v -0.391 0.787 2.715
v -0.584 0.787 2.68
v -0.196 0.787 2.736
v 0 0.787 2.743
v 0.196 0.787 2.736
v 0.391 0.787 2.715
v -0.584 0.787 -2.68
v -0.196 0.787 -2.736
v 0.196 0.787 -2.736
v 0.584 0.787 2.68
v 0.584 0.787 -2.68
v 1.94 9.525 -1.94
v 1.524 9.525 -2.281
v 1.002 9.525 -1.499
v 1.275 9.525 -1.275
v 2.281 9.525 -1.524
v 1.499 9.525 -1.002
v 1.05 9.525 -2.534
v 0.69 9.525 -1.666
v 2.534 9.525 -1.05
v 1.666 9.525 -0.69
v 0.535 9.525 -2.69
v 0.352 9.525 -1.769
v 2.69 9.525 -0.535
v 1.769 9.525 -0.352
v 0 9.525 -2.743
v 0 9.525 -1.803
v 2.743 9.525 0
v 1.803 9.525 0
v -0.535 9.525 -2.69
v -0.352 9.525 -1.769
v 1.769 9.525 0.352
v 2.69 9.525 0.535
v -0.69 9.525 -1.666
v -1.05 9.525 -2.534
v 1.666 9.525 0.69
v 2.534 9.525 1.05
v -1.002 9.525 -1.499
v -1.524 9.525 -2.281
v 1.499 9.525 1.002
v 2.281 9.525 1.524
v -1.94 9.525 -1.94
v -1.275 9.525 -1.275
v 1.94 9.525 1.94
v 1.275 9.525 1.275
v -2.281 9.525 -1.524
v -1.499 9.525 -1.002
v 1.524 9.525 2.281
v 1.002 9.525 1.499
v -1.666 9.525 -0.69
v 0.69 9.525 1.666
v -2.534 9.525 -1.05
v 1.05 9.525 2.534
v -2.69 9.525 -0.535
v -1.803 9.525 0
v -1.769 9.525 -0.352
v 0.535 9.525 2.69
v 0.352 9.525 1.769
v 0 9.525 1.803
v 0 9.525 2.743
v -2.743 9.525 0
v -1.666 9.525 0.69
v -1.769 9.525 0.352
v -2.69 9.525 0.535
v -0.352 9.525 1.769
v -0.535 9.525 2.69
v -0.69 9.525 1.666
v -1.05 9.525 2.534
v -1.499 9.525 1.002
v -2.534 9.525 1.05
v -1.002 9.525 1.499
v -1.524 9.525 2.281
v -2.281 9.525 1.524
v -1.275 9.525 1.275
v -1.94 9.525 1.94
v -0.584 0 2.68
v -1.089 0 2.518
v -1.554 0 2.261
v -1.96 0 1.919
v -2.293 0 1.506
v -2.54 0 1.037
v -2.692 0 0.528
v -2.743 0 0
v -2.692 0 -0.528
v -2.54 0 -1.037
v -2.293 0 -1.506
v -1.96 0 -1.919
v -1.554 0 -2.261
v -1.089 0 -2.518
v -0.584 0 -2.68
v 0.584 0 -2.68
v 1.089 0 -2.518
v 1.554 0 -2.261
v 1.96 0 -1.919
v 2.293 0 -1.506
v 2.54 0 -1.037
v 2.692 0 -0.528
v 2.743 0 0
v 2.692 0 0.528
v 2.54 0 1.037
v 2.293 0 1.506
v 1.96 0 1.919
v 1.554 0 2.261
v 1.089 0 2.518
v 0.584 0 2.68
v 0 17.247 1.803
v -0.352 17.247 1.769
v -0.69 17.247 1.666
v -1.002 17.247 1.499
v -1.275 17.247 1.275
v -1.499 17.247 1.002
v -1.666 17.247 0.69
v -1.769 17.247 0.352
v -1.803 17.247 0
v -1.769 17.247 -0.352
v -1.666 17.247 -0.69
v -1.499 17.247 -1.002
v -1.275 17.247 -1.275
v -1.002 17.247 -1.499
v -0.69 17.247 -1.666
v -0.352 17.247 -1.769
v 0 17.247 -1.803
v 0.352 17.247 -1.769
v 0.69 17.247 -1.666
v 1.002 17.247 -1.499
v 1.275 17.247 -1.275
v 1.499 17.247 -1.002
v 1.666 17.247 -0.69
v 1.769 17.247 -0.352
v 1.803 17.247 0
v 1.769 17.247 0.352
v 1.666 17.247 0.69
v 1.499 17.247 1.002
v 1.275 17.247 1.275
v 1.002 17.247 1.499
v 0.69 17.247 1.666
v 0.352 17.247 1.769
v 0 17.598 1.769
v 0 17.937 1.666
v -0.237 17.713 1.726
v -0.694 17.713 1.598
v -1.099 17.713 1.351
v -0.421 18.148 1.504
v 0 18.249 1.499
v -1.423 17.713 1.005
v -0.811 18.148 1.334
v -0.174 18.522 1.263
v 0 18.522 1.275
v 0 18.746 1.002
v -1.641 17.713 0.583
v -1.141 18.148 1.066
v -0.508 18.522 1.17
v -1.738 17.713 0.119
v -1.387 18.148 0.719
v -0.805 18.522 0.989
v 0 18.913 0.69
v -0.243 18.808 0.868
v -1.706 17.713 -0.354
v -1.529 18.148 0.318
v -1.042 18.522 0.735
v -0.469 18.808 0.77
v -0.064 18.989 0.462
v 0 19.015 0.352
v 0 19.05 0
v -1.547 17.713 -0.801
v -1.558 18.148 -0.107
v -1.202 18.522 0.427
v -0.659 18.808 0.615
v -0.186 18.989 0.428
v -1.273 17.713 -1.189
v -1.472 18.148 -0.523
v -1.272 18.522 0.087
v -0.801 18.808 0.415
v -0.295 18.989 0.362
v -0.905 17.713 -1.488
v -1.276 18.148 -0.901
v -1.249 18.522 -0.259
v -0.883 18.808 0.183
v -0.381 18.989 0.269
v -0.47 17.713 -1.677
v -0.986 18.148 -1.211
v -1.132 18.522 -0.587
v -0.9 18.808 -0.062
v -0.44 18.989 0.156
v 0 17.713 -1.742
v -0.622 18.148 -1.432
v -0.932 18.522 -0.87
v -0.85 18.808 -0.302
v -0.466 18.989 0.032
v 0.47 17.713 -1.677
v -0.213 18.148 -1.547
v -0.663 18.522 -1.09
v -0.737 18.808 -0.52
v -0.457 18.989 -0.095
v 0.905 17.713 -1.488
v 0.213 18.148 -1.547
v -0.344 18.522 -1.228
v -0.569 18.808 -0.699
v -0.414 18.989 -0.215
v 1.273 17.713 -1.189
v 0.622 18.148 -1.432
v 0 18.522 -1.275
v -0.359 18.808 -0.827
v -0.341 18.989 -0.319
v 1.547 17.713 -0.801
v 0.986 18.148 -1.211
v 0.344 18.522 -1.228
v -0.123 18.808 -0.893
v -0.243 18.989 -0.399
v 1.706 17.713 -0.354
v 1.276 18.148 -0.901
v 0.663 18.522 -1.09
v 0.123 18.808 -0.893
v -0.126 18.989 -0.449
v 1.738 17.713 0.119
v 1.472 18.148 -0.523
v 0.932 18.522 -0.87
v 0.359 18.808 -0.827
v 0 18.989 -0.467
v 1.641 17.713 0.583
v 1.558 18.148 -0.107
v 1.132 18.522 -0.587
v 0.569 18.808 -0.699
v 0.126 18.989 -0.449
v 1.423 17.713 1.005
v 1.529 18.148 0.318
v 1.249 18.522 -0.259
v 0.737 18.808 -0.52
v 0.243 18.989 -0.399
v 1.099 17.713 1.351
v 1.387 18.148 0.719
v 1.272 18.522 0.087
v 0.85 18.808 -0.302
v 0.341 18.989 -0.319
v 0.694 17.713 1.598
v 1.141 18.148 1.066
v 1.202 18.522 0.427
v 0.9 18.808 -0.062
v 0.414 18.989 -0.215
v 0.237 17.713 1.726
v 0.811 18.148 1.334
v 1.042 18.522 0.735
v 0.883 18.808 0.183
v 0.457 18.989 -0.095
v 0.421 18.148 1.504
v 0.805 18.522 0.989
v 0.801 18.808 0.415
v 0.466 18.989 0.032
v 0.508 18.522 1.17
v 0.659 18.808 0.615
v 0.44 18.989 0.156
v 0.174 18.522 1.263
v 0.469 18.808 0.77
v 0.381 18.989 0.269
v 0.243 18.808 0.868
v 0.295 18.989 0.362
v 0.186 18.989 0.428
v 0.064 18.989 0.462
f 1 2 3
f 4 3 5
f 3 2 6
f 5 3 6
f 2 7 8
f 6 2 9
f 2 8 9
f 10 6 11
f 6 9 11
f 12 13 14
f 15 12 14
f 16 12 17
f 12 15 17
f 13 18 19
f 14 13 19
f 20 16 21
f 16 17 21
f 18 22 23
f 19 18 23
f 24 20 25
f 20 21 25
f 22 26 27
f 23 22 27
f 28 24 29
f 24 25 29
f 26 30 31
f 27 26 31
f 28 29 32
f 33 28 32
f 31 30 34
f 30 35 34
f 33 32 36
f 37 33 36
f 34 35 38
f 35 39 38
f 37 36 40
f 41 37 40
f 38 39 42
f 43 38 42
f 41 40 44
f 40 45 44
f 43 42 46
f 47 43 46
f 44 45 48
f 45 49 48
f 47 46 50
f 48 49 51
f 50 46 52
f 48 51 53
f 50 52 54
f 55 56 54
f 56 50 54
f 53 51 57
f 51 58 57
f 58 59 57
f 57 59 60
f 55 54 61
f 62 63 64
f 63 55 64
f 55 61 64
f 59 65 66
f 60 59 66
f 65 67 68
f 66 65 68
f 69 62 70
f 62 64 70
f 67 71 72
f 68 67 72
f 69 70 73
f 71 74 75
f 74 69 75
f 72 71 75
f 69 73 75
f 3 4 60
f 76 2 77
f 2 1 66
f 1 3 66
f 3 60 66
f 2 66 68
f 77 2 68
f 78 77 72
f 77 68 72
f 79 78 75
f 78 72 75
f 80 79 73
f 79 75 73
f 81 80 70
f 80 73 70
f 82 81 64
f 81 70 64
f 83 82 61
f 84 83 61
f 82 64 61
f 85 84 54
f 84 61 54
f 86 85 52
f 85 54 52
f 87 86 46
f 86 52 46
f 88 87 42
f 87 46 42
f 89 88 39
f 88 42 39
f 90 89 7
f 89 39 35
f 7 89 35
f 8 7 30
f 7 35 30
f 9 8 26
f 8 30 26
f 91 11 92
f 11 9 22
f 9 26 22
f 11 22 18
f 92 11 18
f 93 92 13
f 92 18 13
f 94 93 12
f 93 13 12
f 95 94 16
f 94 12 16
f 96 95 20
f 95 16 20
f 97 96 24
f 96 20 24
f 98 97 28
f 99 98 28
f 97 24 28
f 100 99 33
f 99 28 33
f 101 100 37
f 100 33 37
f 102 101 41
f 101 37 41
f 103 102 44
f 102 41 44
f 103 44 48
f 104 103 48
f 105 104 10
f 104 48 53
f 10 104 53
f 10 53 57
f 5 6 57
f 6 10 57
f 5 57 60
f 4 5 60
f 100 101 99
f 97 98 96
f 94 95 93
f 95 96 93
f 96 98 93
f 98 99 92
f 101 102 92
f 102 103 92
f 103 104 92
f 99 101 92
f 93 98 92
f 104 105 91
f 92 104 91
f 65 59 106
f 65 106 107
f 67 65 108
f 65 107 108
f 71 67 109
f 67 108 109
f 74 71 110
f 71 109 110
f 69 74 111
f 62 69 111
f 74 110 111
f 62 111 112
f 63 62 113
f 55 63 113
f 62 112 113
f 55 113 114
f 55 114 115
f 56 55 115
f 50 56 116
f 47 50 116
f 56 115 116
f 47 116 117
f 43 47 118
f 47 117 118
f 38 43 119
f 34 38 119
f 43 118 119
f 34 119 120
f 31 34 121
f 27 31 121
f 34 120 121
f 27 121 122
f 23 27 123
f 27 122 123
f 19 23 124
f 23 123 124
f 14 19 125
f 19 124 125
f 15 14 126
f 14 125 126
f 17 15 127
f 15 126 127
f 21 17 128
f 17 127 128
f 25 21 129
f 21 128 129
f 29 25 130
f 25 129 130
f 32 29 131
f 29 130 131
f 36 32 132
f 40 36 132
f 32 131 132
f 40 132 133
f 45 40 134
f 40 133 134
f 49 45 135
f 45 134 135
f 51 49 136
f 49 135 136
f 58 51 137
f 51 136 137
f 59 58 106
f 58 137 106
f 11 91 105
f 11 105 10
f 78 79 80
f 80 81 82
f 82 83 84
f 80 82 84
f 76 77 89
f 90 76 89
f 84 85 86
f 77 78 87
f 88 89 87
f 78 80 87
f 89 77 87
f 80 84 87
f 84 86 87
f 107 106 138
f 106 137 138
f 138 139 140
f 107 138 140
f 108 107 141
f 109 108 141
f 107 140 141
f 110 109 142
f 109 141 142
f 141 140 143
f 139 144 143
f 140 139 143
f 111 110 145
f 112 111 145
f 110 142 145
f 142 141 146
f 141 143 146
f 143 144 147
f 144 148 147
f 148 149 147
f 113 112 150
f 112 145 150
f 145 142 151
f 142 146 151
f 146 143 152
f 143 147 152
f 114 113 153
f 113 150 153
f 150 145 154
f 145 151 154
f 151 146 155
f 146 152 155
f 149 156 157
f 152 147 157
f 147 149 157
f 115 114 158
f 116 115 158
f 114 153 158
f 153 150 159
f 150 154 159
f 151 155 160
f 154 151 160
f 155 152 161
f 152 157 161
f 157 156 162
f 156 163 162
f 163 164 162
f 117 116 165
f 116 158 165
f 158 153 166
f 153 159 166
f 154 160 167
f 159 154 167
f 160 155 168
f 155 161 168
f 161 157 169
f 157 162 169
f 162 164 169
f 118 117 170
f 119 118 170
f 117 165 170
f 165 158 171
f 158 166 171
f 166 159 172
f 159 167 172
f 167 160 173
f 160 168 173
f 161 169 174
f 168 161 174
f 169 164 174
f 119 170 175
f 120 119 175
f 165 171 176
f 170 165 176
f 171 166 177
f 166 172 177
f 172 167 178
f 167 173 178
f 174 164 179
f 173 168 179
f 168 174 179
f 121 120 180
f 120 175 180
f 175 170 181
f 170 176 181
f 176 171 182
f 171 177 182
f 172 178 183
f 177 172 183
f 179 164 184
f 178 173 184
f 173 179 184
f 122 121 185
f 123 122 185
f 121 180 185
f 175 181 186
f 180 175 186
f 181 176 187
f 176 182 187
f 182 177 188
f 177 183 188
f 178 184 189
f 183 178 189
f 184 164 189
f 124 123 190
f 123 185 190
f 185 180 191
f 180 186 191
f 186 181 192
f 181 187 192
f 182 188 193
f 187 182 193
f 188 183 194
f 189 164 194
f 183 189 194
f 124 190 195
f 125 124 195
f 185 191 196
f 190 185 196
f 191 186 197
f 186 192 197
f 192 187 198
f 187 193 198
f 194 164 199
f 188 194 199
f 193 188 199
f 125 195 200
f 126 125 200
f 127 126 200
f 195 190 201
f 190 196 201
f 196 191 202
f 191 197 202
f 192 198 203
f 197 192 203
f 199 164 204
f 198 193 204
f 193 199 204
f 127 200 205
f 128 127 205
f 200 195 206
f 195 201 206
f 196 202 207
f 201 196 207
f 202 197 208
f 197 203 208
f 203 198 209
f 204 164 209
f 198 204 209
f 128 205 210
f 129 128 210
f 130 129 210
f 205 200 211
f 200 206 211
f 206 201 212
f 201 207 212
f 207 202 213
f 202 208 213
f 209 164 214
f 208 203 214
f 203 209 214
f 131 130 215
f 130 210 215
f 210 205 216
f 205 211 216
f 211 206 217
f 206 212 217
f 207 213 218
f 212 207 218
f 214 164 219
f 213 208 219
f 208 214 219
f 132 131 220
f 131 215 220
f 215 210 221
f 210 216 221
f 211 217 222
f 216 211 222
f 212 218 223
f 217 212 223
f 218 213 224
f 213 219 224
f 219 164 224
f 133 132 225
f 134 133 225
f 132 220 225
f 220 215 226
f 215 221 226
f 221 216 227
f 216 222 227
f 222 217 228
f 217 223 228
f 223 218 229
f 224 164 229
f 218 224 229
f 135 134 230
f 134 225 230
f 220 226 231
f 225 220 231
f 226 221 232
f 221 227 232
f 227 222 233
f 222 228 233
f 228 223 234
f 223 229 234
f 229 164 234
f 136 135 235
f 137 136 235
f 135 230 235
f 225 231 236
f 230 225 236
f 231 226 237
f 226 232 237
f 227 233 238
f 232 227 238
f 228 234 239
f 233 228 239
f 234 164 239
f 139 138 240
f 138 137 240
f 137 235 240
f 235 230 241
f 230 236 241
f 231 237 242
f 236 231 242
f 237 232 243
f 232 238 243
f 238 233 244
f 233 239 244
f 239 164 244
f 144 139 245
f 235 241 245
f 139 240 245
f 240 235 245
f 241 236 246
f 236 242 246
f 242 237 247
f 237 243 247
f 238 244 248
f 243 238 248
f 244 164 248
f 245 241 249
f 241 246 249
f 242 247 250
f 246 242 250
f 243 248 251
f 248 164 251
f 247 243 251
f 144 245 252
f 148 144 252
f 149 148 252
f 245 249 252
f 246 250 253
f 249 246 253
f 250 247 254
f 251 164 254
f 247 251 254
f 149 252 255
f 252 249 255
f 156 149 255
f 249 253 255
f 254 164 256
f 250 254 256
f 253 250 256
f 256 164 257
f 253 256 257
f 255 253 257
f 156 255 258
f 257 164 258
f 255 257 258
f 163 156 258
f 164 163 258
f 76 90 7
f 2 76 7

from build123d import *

# Parameters (mm, degrees)
CUT_EXTRUDE1_DEPTH      = 20.441008011
CUT_EXTRUDE1_DEPTH_BACK = 20.441008011
SKETCH2_W               = 1.1684
SKETCH2_H               = 0.7874


with BuildPart() as part:
    # Sketch1 → Revolve1 (revolve)
    with BuildSketch(Plane.XY, mode=Mode.PRIVATE) as revolve1_sk:
        with BuildLine():
            Line((0, 19.05), (0, 0))
            Line((0, 0), (2.7432, 0))
            Line((2.7432, 0), (2.7432, 9.525))
            Line((2.7432, 9.525), (1.8034, 9.525))
            Line((1.8034, 9.525), (1.8034, 17.2466))
            ThreePointArc((1.8034, 17.2466), (1.275196369, 18.521796369), (0, 19.05))
        make_face()
    revolve(revolve1_sk.sketch.rotate(Axis((0, 19.05, 0), (0, -1, 0)), 90), axis=Axis((0, 19.05, 0), (0, -1, 0)))

    # Sketch2 → Cut-Extrude1 (cut, two sides: drawn at the far end of the back side and taken through both)
    with BuildSketch(Plane.XY.offset(-CUT_EXTRUDE1_DEPTH_BACK)):
        with Locations((0, 0.3937)):
            Rectangle(SKETCH2_W, SKETCH2_H)
    extrude(amount=CUT_EXTRUDE1_DEPTH + CUT_EXTRUDE1_DEPTH_BACK, mode=Mode.SUBTRACT)


solid = part.part
